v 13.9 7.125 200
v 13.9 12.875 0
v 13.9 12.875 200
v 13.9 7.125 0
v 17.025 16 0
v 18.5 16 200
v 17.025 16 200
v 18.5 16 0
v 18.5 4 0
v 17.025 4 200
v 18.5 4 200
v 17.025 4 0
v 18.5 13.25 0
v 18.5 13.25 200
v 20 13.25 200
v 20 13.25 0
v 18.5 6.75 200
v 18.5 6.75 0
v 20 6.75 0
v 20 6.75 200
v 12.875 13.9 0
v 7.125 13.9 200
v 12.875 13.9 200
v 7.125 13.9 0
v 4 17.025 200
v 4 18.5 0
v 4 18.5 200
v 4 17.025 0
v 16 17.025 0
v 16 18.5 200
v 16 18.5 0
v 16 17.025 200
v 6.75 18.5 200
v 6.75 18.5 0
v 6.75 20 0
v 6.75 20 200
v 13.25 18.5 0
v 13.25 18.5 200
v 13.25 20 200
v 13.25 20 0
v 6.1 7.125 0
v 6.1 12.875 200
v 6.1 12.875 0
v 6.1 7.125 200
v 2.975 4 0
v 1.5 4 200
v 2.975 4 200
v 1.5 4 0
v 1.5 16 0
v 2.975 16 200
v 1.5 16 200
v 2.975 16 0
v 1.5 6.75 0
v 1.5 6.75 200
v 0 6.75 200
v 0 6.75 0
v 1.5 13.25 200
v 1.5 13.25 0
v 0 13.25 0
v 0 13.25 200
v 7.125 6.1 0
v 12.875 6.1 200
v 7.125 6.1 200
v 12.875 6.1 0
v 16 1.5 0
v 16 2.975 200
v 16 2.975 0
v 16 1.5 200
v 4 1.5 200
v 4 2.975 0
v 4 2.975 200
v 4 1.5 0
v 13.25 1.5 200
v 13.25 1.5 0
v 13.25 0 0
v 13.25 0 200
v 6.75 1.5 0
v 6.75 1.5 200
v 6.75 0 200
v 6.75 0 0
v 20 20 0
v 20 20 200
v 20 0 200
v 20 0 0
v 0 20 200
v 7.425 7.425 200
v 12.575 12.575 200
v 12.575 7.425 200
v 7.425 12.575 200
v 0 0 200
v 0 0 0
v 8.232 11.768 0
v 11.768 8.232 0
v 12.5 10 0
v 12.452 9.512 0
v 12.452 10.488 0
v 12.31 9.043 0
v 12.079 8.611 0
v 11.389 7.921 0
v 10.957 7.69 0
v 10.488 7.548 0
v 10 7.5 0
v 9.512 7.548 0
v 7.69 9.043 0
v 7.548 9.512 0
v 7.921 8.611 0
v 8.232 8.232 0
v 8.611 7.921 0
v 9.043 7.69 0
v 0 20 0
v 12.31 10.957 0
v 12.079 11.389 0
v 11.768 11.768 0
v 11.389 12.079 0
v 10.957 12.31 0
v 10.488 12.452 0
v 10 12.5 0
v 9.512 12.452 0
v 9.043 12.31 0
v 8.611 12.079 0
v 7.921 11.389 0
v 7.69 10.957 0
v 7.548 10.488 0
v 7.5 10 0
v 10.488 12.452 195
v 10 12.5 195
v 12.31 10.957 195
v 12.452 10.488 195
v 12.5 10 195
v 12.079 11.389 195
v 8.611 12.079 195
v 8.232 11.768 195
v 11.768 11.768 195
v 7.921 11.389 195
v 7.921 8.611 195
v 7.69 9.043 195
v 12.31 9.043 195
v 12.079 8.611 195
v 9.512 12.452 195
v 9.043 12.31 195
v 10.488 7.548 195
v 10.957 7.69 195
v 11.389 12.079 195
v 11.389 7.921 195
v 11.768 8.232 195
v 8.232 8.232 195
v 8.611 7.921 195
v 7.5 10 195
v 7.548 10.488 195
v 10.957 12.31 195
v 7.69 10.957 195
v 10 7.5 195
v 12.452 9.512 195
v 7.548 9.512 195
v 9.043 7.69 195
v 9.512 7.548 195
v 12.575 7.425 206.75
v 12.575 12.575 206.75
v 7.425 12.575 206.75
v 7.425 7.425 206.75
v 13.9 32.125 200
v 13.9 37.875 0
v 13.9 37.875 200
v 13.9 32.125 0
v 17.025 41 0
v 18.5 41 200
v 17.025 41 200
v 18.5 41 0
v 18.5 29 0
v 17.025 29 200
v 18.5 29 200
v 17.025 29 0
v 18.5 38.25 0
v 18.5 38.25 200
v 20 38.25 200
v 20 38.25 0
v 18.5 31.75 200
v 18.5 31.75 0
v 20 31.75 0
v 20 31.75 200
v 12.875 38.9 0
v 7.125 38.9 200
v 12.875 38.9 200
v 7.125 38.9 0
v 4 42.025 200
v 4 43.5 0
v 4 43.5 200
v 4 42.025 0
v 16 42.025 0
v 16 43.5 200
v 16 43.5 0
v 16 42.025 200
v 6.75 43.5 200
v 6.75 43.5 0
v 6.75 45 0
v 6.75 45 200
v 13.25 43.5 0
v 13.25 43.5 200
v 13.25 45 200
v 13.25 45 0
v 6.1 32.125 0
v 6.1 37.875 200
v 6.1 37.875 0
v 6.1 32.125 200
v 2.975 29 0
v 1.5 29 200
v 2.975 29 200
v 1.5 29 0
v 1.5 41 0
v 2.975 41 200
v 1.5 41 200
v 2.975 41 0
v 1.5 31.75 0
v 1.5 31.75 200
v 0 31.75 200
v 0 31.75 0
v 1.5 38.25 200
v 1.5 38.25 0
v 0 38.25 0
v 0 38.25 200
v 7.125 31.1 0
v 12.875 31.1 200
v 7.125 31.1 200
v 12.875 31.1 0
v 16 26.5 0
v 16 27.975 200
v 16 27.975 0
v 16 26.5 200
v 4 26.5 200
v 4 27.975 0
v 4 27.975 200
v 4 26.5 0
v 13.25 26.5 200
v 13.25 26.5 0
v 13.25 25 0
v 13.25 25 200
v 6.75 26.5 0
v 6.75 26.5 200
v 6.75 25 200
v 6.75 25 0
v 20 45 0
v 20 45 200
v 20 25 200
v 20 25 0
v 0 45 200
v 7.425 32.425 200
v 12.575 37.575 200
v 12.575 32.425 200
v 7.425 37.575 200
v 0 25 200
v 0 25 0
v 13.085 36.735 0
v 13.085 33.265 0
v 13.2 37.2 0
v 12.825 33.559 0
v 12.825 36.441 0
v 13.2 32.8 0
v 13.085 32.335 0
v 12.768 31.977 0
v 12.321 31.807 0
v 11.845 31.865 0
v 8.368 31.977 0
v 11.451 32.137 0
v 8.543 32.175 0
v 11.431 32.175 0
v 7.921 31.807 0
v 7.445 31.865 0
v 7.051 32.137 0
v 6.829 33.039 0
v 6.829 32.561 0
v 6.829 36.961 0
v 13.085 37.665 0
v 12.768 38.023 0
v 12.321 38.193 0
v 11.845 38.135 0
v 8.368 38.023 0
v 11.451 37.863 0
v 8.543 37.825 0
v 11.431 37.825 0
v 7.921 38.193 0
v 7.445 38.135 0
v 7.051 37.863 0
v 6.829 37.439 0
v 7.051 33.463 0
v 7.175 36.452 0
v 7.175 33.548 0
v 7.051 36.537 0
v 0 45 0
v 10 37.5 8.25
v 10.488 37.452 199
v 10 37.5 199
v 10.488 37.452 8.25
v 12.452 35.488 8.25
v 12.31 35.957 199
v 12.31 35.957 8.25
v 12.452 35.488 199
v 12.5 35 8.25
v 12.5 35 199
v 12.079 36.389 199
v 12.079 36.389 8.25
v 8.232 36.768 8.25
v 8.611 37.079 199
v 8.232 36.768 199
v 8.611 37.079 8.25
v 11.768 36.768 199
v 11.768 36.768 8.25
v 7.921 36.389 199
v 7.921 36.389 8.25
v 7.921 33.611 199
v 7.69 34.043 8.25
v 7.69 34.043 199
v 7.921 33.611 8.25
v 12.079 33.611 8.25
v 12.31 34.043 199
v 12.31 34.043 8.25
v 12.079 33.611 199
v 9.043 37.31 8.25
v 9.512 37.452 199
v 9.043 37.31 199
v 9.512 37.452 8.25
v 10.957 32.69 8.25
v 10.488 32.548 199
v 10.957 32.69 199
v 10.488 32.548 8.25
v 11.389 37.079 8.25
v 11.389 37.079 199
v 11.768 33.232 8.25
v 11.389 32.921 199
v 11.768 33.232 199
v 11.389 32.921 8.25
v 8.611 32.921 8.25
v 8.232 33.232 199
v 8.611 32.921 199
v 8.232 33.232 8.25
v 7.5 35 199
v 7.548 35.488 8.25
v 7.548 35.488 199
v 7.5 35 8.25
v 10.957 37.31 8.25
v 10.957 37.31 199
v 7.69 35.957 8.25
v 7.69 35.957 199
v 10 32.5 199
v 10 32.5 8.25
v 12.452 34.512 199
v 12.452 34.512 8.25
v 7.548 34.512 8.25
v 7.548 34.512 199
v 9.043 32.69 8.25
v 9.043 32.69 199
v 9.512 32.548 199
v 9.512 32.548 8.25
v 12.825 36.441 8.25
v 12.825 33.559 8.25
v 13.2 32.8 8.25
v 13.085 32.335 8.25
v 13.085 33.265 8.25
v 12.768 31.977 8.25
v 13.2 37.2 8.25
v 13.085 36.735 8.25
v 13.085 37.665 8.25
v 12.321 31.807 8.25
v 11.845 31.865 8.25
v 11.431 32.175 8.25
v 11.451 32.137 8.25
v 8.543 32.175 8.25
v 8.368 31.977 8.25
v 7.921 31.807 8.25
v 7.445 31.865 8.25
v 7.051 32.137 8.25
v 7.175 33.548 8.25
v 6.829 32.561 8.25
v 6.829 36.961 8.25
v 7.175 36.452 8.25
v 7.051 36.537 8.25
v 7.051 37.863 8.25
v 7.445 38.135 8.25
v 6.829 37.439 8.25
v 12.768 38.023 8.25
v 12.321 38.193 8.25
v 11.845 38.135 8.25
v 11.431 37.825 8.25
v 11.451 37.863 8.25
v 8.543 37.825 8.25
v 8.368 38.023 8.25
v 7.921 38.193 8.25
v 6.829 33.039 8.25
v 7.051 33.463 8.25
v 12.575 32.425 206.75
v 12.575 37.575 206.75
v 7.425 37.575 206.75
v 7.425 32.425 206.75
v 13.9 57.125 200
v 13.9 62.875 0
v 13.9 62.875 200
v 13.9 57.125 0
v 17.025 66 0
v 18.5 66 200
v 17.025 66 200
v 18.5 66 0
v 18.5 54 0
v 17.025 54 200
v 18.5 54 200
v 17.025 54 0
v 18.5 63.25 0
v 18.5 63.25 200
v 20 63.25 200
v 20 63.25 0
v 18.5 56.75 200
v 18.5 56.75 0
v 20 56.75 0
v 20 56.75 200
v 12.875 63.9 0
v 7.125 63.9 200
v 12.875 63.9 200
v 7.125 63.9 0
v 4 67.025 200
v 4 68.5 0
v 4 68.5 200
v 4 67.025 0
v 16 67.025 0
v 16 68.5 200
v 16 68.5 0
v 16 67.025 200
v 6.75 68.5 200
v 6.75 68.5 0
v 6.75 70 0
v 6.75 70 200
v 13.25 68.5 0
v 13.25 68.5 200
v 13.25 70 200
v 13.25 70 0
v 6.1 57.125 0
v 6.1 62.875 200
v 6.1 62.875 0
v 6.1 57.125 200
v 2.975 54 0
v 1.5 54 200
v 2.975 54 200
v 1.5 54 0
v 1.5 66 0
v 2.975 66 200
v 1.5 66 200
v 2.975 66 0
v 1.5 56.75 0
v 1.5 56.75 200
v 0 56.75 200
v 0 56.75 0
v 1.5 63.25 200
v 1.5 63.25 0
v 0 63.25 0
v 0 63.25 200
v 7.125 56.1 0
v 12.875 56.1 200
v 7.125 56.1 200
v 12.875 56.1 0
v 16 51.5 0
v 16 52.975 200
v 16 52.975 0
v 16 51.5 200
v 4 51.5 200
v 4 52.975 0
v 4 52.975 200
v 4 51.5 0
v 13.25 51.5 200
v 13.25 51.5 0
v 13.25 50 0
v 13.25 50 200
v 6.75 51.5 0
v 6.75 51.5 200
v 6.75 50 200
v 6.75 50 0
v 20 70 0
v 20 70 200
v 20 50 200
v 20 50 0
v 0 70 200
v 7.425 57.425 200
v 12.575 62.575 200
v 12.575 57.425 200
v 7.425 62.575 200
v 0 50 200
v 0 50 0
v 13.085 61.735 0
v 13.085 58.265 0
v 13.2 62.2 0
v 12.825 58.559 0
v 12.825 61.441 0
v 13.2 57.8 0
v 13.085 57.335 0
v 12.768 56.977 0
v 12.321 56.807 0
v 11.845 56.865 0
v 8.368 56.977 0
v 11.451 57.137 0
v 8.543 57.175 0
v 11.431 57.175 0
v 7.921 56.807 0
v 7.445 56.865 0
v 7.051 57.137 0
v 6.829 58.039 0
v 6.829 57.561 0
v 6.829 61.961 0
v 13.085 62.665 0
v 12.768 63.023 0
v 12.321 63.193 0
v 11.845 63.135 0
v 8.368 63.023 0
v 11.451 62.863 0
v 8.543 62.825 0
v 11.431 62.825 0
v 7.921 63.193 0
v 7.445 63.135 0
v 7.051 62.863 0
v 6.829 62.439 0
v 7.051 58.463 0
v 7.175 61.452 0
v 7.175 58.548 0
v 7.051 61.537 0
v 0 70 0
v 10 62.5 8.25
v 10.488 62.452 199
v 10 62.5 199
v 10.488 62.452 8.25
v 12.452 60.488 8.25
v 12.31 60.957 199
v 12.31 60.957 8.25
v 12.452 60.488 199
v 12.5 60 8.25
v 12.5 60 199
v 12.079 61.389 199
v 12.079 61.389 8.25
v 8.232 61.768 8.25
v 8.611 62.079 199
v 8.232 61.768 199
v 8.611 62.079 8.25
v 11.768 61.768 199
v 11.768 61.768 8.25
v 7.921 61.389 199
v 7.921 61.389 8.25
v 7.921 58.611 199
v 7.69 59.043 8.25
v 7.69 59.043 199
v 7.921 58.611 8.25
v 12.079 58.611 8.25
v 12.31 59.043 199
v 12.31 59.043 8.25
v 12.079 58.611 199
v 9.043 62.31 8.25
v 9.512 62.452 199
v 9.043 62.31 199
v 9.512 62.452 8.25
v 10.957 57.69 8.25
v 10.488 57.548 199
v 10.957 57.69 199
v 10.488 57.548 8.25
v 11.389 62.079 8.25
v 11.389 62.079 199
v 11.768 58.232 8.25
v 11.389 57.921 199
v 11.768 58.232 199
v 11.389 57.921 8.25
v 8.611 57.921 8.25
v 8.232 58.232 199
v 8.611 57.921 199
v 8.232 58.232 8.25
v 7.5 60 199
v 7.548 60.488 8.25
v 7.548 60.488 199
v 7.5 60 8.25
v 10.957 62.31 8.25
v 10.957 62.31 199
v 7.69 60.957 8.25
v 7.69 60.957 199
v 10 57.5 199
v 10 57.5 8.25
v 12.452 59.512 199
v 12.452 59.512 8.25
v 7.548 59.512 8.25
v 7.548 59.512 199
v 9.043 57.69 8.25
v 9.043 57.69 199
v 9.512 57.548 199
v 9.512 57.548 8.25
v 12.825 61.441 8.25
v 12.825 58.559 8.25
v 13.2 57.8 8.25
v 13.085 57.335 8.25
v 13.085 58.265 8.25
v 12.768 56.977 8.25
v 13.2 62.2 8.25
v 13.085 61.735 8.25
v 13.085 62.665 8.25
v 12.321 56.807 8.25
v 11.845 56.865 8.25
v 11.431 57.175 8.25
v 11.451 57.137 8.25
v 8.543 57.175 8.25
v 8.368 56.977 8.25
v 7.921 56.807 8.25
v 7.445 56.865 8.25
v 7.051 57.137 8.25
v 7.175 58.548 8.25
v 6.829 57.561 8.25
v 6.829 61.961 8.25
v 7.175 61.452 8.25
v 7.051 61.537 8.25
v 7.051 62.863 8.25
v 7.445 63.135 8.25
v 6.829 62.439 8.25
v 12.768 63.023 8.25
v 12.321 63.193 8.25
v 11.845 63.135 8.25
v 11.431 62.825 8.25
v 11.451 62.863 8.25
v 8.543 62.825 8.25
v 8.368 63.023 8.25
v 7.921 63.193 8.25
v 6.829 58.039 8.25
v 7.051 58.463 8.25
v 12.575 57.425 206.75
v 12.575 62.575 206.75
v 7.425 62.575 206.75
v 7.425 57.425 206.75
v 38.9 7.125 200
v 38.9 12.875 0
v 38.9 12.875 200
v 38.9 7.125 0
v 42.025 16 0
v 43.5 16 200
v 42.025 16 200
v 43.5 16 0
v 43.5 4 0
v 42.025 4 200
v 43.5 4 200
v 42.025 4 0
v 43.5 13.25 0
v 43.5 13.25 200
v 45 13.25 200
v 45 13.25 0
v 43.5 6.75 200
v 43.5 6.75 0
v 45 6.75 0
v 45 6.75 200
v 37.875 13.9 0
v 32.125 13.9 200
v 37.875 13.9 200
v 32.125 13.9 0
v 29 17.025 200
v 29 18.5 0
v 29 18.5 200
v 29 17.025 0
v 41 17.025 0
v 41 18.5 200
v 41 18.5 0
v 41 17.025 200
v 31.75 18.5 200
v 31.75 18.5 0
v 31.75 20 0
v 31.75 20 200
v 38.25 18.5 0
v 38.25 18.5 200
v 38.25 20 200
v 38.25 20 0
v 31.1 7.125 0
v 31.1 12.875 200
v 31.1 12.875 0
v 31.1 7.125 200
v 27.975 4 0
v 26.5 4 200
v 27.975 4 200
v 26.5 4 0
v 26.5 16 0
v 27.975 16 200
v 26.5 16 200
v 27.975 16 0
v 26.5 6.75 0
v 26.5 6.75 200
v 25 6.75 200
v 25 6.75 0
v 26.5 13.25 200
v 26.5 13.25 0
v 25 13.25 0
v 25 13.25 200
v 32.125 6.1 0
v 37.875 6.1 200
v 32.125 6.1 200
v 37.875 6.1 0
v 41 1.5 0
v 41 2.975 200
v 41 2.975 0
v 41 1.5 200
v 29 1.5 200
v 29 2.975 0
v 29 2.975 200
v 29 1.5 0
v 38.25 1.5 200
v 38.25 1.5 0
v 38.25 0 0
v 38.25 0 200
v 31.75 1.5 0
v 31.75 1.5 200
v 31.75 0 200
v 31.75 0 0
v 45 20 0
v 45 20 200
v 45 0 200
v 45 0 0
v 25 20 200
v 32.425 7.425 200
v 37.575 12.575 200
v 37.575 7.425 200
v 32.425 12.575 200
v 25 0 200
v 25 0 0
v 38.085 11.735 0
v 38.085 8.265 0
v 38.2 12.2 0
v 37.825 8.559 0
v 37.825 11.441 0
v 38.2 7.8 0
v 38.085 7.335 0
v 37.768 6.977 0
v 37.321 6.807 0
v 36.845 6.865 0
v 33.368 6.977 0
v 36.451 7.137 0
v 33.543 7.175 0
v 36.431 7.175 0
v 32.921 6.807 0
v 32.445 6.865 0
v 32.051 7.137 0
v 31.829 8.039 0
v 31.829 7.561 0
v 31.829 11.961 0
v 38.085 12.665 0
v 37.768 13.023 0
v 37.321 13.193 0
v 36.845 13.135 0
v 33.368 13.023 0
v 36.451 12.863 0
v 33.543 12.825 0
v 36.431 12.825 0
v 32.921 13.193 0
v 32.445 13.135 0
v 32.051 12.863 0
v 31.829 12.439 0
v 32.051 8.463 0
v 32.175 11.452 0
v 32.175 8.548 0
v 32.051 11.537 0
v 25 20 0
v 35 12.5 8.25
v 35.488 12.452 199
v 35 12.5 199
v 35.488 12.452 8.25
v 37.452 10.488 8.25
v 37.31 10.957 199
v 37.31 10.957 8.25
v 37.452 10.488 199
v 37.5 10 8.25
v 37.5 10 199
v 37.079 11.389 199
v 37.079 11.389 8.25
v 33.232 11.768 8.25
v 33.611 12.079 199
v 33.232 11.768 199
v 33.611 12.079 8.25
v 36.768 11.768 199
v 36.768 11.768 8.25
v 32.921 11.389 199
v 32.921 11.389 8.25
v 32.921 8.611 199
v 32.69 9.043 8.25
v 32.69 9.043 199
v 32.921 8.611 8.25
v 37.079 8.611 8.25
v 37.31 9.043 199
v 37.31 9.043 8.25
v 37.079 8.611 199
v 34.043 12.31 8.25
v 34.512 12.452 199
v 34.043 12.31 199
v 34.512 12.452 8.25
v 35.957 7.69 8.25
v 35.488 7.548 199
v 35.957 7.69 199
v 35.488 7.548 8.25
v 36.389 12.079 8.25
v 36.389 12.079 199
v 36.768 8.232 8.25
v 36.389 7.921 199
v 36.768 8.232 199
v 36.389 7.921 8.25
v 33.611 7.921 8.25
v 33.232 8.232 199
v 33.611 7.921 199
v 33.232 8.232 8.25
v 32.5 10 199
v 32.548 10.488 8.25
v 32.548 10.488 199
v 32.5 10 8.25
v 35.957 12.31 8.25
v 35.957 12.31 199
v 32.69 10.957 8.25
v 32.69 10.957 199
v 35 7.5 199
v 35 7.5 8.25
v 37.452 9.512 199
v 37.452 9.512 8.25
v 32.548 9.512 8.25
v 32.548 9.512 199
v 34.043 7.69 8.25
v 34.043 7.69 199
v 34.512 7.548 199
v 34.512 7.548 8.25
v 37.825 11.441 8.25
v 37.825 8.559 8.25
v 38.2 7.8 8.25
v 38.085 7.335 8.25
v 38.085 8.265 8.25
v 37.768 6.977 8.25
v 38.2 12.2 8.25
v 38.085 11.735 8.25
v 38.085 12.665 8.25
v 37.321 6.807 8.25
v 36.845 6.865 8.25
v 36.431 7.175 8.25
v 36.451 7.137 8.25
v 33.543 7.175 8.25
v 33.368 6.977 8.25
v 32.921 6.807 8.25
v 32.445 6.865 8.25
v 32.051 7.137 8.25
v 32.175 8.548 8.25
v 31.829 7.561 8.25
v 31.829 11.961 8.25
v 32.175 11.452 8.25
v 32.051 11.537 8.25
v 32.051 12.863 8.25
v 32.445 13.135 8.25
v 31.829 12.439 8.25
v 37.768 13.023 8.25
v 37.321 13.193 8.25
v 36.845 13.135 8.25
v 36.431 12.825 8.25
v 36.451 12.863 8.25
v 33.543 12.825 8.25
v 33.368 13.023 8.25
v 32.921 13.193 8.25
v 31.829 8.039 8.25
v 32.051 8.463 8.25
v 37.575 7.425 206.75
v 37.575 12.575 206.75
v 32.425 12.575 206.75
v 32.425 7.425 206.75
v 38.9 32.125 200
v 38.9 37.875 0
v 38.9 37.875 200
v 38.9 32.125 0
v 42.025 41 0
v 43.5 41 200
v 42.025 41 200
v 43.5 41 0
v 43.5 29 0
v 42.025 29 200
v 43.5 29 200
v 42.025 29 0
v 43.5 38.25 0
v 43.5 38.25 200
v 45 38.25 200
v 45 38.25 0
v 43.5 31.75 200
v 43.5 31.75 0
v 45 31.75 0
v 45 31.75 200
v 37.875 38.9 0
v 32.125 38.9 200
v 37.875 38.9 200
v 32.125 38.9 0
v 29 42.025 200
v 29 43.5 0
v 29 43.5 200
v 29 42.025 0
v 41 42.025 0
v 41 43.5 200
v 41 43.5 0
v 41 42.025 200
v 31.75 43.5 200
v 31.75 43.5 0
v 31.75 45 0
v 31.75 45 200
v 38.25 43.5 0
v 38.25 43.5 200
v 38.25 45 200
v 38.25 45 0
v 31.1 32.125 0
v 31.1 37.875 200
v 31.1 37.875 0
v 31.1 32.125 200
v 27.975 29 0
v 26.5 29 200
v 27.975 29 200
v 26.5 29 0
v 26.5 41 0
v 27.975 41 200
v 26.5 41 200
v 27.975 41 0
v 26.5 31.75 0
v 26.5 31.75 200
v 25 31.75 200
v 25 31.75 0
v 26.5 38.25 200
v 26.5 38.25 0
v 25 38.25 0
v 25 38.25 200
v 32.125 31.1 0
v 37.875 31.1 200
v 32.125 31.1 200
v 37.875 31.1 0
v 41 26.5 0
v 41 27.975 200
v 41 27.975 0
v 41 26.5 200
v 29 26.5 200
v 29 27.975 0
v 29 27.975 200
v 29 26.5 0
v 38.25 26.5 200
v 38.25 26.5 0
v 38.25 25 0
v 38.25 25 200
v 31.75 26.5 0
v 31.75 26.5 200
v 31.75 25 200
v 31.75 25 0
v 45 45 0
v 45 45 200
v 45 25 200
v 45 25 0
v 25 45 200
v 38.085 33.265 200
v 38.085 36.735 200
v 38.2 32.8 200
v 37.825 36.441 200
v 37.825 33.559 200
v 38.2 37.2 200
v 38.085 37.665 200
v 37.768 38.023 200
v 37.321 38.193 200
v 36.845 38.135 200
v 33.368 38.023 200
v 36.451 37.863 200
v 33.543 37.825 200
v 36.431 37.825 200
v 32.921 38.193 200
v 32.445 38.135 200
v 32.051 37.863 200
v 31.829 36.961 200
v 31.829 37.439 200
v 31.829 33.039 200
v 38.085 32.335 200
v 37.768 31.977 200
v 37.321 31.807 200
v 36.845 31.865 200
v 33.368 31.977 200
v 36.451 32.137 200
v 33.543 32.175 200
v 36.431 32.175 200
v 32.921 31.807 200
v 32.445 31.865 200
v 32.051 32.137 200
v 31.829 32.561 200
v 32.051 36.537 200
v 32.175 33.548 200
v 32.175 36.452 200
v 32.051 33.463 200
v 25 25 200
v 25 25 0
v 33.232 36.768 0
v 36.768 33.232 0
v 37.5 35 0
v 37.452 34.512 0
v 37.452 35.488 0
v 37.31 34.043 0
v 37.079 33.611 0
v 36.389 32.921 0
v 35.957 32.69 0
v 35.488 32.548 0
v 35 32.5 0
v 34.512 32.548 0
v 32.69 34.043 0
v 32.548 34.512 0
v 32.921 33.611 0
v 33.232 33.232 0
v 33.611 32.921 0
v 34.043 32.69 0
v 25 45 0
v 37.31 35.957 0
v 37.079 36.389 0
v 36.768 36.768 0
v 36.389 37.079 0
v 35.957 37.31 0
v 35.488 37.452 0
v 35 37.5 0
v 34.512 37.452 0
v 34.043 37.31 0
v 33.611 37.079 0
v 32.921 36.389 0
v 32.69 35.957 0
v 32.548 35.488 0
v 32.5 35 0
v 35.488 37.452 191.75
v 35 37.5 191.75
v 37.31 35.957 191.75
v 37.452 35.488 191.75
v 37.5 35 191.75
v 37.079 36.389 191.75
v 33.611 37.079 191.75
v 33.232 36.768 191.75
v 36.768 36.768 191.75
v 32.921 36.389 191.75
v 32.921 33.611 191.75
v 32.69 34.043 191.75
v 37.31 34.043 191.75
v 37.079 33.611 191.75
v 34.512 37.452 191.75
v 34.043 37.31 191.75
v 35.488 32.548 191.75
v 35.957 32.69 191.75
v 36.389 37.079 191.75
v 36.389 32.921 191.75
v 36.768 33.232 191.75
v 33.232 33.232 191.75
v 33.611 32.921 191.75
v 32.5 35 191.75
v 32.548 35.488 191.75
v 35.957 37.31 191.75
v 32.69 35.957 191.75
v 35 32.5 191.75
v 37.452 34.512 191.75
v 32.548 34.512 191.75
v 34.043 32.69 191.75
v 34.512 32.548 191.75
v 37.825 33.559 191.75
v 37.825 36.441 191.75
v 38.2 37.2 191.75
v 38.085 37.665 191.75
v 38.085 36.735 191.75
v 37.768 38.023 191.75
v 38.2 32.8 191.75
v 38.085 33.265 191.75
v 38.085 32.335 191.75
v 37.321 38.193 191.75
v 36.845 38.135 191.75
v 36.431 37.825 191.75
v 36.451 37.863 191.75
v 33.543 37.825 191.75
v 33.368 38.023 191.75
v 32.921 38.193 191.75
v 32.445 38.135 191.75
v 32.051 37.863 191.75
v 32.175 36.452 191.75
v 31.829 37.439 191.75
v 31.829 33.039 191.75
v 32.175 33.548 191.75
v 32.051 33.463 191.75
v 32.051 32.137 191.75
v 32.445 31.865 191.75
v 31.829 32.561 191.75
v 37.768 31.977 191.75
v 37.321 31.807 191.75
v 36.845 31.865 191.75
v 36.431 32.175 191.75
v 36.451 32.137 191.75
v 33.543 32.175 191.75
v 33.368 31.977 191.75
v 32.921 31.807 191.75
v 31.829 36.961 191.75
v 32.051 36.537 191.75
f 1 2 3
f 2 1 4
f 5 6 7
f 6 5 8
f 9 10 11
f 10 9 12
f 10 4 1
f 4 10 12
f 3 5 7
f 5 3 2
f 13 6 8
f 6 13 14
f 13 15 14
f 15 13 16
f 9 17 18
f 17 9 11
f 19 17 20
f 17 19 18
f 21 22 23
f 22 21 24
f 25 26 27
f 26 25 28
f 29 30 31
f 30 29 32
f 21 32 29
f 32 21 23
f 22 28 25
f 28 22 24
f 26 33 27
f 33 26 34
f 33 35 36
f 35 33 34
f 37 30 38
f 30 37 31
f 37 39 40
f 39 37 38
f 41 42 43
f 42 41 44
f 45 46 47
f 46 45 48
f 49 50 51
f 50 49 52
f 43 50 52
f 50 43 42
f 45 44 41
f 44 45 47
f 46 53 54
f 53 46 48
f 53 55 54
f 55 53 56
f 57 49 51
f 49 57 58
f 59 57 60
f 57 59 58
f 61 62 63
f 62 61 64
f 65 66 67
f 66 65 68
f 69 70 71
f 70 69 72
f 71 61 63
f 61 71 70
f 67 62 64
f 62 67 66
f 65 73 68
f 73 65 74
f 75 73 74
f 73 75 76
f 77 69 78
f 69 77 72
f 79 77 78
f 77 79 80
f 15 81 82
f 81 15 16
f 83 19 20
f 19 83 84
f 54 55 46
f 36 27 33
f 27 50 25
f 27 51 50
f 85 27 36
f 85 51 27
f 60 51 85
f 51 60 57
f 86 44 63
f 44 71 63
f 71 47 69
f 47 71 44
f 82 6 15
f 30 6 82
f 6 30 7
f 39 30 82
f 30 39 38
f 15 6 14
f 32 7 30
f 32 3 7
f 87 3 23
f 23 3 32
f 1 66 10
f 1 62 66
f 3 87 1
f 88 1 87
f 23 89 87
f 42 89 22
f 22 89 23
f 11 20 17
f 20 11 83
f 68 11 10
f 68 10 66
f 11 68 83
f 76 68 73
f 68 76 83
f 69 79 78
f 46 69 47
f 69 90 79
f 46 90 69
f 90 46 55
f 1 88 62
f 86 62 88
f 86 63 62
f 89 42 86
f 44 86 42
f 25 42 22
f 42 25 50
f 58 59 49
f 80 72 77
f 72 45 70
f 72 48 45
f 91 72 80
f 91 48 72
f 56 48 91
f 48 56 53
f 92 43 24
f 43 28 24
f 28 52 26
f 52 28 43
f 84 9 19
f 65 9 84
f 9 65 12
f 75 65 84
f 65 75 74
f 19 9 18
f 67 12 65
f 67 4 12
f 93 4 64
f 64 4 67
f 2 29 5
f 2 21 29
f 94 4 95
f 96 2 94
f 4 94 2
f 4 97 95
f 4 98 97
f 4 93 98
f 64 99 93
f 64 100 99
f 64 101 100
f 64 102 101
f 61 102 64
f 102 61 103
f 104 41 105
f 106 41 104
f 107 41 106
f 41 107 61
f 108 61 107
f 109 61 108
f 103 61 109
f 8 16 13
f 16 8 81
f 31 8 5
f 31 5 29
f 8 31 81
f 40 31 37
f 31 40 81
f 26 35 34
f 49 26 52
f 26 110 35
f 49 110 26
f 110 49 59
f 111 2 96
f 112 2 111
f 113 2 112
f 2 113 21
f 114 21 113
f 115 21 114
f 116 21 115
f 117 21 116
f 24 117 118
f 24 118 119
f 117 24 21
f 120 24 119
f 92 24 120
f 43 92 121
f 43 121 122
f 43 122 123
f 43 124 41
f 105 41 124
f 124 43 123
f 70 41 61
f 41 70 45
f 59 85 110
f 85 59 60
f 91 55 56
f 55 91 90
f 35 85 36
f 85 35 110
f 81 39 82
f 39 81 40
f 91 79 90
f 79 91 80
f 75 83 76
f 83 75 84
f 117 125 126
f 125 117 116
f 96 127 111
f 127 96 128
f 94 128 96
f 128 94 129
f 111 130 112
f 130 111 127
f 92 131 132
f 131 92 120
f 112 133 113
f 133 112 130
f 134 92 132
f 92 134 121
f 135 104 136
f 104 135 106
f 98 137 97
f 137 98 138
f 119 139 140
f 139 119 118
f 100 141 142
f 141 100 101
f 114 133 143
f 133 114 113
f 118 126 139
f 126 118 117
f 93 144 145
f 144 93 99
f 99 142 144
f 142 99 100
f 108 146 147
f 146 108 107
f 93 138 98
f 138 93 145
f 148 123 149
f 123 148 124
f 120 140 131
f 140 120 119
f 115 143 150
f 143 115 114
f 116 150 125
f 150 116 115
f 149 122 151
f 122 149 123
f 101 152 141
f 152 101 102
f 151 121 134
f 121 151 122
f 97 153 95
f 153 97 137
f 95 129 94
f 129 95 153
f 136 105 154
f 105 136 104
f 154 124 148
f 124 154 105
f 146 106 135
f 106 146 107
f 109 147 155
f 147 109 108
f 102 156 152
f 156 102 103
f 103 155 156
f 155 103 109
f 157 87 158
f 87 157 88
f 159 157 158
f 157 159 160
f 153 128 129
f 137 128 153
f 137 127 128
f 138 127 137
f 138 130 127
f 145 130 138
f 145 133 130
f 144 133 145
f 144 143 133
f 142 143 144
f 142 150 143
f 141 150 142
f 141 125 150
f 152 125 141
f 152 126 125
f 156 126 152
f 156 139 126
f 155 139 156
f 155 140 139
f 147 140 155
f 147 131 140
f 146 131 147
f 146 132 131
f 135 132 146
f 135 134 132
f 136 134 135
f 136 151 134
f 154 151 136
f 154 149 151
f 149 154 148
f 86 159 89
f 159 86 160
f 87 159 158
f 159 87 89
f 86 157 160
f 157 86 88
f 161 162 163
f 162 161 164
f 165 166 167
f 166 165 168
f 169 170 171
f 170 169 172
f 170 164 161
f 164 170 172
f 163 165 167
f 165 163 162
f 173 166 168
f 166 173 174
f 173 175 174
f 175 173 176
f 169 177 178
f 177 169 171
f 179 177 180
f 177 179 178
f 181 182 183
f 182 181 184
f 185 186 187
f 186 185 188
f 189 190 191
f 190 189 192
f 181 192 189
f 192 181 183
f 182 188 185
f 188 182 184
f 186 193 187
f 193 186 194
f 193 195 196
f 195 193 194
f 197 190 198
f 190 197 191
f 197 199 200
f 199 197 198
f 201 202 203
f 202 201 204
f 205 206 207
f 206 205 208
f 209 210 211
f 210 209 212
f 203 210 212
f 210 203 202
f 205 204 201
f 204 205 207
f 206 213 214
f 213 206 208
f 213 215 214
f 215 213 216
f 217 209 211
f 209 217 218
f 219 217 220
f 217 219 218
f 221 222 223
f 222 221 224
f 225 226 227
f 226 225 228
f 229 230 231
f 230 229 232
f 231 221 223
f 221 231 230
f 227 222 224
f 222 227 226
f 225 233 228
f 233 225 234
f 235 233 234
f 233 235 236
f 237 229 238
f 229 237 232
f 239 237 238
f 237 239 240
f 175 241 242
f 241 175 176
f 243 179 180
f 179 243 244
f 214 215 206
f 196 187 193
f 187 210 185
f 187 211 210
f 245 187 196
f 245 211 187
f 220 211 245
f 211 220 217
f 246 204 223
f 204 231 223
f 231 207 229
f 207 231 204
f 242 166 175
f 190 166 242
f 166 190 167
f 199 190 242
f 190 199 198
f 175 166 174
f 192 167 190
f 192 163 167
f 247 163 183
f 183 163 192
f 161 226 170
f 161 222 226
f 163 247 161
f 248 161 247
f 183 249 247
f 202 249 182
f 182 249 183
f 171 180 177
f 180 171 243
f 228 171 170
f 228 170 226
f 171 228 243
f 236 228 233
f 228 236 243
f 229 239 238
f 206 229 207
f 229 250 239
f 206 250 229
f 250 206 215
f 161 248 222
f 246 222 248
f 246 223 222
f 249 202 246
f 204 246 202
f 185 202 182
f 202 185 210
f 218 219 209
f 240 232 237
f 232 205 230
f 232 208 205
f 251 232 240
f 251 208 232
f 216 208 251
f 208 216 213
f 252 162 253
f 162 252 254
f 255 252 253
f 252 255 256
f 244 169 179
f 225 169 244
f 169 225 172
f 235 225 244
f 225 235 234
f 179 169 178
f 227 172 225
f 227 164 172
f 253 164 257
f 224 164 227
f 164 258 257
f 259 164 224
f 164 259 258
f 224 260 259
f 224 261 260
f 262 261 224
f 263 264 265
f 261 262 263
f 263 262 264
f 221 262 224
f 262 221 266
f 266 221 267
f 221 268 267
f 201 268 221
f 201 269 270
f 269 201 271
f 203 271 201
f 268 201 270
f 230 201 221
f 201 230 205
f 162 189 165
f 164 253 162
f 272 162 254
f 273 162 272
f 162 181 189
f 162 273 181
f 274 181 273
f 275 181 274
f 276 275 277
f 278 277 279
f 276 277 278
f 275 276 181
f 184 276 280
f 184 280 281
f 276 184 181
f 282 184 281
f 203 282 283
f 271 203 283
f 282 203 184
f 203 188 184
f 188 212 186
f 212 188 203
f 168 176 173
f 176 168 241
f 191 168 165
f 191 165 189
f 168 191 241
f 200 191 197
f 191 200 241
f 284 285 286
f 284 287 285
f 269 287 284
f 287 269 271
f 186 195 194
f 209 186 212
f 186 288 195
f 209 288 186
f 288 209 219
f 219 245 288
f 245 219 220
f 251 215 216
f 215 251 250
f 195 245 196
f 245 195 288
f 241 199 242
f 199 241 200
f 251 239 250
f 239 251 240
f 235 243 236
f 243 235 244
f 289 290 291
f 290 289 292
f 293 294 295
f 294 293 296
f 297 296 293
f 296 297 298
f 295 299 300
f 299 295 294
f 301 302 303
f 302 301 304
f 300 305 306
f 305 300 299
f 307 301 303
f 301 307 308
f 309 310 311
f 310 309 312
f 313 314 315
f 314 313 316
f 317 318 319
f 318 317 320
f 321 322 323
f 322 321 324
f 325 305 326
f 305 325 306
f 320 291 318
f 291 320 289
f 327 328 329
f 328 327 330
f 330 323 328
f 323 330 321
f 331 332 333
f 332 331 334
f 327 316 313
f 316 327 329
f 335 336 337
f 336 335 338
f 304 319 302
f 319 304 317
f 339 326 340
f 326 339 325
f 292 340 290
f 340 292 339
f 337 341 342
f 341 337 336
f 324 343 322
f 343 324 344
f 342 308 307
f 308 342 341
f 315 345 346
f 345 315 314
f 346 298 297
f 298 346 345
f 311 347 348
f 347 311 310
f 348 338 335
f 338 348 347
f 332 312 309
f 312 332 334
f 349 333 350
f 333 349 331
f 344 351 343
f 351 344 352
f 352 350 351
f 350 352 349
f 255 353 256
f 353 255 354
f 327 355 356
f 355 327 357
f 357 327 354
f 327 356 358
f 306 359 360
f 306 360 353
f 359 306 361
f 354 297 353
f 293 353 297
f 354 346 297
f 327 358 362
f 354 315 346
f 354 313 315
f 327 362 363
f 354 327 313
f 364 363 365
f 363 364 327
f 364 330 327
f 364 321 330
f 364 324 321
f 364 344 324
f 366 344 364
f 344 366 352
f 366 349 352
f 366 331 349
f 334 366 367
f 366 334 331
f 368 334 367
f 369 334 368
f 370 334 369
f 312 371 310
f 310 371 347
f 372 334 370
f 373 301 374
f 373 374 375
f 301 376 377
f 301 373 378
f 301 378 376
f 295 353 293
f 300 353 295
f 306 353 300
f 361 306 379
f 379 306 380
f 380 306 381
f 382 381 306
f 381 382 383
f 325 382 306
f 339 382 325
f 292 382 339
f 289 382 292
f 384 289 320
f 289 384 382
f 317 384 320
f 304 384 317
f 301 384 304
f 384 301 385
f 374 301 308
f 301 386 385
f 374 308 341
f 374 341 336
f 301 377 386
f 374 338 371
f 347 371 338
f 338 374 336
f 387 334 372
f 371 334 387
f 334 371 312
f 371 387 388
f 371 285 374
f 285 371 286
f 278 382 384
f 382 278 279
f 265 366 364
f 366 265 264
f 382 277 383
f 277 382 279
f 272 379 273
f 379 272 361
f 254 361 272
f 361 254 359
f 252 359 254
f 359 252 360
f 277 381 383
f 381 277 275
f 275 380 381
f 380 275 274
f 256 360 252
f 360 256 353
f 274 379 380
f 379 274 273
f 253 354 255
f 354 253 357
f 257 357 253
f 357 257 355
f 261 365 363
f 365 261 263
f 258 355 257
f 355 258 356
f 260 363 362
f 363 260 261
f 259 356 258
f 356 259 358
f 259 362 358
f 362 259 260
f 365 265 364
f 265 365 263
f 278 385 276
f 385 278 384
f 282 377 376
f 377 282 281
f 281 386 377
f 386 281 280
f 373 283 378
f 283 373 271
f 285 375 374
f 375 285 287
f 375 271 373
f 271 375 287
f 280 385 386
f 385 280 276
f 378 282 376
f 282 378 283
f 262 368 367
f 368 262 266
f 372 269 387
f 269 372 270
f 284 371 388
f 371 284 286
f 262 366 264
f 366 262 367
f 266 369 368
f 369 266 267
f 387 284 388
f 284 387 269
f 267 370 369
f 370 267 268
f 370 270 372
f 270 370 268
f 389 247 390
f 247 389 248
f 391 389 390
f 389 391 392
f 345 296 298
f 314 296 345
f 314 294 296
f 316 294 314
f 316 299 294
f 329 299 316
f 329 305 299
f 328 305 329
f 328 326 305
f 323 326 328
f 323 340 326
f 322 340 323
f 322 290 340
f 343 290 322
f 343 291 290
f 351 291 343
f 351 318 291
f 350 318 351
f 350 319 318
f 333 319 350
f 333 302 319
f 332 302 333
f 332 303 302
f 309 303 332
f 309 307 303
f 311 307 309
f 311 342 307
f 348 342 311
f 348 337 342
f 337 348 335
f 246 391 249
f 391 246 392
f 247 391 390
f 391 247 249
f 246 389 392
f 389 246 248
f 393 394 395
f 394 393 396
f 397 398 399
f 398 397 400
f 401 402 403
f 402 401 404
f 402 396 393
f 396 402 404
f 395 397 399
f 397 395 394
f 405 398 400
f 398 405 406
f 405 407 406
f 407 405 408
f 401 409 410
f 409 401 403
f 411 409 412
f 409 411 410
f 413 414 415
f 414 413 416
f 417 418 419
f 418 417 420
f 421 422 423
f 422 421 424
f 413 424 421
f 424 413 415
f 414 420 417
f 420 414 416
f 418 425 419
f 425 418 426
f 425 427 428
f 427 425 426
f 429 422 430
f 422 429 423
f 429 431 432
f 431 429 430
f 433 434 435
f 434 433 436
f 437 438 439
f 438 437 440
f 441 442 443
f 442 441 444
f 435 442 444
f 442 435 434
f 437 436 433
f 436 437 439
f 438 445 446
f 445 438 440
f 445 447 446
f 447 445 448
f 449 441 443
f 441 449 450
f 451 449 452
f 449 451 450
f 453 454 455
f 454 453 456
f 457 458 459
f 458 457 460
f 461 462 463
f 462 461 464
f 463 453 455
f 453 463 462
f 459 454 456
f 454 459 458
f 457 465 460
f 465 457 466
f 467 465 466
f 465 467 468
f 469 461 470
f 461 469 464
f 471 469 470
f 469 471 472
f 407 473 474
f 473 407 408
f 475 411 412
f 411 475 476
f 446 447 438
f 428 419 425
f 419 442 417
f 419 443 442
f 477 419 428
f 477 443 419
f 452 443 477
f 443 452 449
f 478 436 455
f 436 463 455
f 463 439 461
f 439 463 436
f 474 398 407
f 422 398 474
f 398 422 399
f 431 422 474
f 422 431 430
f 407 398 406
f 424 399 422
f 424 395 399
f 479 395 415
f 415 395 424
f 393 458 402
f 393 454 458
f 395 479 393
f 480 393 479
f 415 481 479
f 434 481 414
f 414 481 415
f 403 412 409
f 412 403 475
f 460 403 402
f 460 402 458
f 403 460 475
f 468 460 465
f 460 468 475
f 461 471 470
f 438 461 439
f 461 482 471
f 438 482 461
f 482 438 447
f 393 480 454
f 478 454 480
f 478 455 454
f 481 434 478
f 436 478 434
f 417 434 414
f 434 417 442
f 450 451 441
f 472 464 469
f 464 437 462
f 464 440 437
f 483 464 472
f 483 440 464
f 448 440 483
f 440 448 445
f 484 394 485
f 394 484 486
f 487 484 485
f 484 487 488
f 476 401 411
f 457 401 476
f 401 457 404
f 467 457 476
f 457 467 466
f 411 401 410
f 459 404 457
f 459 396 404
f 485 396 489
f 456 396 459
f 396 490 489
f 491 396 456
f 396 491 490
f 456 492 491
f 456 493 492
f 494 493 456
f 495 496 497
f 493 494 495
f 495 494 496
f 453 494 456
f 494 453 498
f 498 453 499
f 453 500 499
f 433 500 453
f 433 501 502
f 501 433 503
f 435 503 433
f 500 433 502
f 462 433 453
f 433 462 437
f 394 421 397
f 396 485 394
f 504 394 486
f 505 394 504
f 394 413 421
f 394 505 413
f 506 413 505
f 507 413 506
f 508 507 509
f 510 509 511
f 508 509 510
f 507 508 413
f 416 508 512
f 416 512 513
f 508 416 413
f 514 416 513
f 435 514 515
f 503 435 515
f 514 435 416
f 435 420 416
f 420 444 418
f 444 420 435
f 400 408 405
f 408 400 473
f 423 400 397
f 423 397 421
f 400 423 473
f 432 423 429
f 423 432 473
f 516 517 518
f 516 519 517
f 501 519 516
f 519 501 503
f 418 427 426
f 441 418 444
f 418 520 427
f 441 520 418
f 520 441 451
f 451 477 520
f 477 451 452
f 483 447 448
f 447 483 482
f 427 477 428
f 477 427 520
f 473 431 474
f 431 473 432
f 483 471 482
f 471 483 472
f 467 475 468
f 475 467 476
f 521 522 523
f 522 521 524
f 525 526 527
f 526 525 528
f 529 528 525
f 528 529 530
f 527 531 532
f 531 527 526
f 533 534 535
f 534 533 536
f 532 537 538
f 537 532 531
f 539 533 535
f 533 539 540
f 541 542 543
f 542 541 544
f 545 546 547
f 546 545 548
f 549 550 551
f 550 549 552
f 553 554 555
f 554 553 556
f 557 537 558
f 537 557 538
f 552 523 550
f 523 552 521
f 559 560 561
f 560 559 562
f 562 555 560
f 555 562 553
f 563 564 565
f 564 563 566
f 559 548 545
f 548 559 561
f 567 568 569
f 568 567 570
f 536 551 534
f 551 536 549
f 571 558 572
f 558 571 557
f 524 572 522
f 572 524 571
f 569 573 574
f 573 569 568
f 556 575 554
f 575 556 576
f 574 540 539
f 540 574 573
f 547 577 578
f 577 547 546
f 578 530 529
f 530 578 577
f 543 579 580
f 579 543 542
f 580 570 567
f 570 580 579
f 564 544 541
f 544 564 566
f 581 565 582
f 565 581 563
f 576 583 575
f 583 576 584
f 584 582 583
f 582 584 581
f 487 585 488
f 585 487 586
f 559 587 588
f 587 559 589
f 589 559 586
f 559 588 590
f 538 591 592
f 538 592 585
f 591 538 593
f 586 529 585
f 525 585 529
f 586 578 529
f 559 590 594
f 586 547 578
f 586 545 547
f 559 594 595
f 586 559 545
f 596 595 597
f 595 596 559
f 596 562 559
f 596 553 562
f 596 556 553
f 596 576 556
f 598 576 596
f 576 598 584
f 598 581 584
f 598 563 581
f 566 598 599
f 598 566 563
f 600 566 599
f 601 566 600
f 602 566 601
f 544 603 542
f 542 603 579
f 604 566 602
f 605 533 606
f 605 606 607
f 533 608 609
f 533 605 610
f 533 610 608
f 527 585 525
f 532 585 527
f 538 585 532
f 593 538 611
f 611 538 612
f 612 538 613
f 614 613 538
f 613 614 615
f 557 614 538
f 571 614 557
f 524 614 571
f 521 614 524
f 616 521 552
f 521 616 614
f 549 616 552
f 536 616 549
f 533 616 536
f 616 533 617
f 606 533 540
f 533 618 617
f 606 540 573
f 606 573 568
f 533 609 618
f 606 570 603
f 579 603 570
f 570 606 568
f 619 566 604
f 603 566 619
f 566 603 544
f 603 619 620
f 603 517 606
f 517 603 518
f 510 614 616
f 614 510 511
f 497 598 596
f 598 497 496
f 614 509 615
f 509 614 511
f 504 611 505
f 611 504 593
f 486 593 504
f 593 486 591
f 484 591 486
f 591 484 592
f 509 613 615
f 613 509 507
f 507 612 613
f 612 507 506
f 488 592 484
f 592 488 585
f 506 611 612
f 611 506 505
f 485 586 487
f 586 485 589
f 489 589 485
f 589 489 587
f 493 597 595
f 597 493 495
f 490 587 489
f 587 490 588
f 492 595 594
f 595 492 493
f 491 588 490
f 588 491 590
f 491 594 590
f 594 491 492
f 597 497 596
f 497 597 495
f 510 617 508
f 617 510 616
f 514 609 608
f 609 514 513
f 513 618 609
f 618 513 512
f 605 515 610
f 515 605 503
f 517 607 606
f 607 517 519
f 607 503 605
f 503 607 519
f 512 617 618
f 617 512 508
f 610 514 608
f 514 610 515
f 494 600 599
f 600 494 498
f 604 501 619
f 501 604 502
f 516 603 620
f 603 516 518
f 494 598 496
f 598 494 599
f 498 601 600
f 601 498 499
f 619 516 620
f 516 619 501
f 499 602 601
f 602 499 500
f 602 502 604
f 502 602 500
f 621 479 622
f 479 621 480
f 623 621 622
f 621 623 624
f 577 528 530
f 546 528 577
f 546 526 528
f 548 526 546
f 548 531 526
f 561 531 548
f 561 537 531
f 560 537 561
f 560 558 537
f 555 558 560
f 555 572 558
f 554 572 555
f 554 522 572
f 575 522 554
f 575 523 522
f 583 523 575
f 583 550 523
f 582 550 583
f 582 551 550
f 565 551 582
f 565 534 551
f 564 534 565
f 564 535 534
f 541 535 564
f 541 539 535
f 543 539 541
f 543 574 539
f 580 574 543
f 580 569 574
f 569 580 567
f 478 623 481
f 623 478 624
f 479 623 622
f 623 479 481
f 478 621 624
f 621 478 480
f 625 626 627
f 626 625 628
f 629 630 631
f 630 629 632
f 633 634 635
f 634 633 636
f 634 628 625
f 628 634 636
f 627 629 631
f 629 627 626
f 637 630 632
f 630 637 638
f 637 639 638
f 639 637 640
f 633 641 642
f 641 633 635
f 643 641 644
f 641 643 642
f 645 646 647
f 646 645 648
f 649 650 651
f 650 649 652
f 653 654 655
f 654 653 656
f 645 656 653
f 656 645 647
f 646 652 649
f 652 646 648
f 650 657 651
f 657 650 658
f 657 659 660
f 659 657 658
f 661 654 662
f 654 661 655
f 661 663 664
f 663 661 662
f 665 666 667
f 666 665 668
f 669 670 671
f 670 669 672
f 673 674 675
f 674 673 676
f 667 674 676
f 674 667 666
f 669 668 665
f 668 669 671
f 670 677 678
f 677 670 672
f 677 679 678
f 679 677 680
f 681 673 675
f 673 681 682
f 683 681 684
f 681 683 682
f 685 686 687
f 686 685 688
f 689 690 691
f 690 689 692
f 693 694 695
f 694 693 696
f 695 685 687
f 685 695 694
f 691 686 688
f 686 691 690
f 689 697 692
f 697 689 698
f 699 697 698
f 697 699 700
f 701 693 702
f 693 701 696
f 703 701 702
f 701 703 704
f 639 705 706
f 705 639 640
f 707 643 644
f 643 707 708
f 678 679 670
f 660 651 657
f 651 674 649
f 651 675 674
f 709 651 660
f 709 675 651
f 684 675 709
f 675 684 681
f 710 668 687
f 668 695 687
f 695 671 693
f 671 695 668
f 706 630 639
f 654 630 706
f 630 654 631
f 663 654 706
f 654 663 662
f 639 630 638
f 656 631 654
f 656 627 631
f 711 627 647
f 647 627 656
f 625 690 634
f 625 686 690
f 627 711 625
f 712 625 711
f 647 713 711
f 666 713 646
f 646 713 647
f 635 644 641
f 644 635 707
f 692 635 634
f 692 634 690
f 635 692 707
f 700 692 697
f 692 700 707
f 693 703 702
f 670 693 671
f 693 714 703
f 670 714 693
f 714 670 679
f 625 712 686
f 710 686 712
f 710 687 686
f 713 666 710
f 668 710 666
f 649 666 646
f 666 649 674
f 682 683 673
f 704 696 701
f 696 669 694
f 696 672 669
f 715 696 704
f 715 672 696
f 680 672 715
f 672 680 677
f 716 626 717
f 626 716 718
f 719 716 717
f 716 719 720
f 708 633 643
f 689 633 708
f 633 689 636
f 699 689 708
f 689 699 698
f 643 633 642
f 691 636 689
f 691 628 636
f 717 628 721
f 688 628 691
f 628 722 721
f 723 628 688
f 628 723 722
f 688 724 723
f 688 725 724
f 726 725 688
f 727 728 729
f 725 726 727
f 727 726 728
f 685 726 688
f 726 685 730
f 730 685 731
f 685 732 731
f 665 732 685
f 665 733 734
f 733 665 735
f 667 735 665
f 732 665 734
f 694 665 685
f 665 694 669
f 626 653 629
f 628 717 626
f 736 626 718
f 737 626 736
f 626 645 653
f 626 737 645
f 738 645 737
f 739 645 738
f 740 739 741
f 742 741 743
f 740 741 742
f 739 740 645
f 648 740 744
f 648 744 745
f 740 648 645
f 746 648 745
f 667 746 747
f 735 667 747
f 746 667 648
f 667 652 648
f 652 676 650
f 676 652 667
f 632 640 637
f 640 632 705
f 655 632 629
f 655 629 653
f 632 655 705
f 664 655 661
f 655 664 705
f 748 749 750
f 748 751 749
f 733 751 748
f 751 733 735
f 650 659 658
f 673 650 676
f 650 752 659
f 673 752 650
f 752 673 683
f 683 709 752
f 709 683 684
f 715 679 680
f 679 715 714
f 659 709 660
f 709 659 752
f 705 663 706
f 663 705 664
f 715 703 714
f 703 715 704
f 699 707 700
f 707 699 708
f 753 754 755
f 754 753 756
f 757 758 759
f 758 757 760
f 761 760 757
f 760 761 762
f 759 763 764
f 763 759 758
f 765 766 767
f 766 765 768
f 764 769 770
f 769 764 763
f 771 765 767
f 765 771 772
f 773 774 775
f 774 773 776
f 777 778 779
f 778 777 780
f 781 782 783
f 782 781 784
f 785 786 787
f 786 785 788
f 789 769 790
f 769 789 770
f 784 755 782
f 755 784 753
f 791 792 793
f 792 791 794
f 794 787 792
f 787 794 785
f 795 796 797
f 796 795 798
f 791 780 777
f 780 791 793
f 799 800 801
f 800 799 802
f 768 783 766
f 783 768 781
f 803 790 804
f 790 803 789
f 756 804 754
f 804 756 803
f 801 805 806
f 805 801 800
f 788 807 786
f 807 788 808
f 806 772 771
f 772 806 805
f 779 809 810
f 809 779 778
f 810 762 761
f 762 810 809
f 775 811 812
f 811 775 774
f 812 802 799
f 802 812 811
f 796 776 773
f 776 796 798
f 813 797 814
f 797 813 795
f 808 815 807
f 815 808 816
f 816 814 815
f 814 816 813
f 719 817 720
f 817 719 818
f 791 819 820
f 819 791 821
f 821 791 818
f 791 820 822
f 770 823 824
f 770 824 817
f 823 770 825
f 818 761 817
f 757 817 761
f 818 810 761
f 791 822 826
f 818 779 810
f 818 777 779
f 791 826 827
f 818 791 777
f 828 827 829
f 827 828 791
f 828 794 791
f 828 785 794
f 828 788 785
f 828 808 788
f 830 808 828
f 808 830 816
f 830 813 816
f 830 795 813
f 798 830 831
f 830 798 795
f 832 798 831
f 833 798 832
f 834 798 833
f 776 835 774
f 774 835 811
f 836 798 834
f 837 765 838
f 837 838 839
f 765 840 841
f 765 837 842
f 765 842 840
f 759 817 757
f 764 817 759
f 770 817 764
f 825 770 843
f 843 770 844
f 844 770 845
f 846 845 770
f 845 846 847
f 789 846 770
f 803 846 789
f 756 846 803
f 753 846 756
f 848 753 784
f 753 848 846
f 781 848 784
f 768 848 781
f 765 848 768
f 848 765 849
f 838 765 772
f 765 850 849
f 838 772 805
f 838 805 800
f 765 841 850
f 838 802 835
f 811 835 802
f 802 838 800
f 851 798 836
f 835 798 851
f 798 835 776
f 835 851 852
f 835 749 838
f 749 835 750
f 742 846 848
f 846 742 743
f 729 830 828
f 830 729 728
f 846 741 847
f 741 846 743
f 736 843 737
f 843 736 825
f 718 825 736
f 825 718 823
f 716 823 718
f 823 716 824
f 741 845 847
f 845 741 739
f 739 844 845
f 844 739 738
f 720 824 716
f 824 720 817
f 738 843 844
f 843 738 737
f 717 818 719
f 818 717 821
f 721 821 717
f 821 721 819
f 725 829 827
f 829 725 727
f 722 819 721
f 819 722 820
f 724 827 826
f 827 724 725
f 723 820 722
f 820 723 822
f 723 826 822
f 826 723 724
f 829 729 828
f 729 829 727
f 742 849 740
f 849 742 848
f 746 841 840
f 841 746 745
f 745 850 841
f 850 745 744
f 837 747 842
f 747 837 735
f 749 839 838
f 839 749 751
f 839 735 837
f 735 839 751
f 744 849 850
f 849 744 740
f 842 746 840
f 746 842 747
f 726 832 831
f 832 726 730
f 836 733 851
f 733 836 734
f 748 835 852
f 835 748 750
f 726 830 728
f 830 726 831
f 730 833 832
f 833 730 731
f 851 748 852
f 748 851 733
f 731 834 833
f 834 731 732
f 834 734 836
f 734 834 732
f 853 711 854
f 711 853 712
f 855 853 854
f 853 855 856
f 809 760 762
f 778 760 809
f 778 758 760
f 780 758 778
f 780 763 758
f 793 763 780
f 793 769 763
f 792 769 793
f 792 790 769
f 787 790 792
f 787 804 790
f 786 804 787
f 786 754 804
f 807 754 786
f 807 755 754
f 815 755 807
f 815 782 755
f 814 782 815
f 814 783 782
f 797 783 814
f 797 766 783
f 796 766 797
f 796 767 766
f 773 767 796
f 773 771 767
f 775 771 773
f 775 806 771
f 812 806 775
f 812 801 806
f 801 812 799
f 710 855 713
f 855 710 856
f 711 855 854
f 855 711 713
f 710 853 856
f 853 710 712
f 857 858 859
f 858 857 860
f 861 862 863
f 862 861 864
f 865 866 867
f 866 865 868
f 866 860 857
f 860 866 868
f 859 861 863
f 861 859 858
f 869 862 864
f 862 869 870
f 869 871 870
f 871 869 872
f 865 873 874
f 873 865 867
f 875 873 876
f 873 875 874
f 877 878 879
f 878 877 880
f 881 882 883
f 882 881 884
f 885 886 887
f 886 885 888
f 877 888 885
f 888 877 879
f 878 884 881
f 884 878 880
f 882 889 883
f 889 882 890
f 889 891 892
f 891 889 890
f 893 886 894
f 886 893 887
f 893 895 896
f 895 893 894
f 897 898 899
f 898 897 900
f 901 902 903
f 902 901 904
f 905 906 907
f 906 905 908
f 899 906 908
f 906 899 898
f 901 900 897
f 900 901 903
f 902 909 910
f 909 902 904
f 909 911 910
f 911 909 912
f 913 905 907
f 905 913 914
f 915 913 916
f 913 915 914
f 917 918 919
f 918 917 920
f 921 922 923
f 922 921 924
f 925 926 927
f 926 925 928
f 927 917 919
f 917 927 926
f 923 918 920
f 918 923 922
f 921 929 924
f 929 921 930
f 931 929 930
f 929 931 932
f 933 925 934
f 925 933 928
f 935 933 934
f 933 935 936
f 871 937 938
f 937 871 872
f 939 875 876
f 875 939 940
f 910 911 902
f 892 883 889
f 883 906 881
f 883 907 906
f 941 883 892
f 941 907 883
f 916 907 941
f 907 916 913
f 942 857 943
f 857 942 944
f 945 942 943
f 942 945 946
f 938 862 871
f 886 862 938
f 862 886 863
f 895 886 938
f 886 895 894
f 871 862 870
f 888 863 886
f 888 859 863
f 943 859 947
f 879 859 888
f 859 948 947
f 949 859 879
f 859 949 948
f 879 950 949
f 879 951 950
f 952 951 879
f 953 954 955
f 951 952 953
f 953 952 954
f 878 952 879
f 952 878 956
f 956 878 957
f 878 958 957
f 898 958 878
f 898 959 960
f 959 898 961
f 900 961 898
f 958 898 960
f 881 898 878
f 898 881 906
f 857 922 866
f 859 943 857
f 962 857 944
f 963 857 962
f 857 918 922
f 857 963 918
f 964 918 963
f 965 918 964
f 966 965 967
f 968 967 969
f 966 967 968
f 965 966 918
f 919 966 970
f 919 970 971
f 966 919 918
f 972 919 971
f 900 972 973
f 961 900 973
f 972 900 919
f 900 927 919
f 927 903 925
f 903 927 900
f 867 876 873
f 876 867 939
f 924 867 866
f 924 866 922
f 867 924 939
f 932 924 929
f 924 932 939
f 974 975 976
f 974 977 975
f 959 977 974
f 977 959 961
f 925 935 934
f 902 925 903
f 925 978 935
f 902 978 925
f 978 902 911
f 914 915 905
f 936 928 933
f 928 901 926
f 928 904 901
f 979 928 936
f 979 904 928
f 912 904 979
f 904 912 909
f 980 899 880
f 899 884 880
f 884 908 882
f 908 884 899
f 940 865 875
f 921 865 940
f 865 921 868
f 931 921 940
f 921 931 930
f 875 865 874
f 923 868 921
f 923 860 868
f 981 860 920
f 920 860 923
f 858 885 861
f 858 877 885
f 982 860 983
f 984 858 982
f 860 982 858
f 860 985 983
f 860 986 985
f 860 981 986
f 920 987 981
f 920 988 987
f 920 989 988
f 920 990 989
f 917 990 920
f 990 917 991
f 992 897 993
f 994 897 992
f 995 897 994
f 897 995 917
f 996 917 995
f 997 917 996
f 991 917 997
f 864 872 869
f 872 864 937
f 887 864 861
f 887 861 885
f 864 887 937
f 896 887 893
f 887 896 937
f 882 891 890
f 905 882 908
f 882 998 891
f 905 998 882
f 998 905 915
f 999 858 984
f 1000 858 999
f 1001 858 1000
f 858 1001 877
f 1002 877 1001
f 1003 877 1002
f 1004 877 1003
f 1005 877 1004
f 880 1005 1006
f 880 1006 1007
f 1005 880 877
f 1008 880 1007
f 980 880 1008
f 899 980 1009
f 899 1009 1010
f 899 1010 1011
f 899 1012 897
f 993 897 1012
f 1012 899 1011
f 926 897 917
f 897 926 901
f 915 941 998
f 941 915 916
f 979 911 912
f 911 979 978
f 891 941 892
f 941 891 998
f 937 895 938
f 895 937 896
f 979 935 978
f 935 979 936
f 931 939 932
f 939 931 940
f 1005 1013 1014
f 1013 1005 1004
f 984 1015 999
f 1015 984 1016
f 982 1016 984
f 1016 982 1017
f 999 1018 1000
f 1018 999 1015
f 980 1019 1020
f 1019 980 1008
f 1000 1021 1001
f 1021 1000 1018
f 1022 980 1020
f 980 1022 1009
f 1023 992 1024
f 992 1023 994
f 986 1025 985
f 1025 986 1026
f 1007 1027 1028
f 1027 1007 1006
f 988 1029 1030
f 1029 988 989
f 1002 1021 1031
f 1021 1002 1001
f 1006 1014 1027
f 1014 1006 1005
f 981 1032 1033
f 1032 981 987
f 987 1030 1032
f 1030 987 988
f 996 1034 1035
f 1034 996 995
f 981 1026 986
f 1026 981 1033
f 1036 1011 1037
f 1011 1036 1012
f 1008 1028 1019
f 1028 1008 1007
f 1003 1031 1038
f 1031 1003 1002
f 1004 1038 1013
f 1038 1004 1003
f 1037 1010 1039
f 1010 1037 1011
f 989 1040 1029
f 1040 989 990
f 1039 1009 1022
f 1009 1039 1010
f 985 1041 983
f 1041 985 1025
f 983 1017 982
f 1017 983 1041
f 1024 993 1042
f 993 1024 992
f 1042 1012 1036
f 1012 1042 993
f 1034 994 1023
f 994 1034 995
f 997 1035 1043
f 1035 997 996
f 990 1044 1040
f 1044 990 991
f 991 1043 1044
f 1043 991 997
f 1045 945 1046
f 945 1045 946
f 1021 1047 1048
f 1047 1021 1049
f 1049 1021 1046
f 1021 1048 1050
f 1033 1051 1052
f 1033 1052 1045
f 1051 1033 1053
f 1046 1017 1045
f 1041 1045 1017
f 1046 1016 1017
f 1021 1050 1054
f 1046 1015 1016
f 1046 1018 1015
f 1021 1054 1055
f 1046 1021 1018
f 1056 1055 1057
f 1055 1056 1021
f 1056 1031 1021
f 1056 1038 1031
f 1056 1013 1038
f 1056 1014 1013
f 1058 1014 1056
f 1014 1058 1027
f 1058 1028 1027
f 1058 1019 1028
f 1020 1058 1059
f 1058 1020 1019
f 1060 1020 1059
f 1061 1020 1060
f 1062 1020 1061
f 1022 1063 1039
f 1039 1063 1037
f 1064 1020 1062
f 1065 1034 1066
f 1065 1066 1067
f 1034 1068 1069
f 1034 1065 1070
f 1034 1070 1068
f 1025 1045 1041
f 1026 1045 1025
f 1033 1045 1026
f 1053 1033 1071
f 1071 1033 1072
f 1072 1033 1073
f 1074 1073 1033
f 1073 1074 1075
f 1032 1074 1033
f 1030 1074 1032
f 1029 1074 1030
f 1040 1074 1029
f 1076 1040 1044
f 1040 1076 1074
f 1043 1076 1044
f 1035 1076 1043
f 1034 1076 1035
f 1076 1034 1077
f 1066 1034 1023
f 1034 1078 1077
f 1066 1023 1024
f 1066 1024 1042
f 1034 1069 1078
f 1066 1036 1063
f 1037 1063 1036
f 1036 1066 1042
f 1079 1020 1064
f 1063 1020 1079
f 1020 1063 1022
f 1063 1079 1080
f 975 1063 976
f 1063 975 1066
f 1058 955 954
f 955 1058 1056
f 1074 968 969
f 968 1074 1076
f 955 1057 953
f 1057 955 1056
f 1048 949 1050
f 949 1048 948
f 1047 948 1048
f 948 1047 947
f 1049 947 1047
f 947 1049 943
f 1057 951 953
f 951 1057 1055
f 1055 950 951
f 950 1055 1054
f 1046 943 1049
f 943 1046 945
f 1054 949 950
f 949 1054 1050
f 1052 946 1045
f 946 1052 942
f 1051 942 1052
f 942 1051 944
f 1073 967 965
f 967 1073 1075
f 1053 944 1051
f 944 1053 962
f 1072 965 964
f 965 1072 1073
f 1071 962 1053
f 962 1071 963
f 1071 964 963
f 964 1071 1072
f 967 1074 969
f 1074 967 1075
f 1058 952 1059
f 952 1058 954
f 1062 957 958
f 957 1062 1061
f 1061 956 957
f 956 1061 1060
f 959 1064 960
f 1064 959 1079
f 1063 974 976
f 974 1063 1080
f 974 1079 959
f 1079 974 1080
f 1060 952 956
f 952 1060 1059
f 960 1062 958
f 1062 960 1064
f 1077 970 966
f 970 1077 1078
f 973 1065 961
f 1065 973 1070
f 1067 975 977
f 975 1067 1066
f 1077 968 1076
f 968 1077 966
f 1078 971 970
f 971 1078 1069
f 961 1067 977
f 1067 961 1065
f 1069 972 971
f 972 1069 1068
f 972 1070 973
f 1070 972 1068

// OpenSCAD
profileLength = 1000;
//printX = 150; Not implemented
//printY = 150; Not implemented
printZHeight = 230;
printTolerance = 0.25; //Change dimensions of pin and hole 0.25mm equals gab of 0.5 mm
spaceBetweenProfiles = 5;
$fa=0.5; // default minimum facet angle is now 0.5
$fs=0.5; // default minimum facet size is now 0.5 mm

if(profileLength <= printZHeight) {
	translate([10,10,profileLength/2]) profile(profileLength);
} else {
	numOfProfiles = ceil(profileLength/(printZHeight-8));
	numOfRow = ceil(sqrt(numOfProfiles));
	currentProfile = 2;
	start = 0;
	translate([start,start,0]) profileWithPin(profileLength/numOfProfiles, printTolerance);
	for(row=[0:numOfRow-1]) {
		for(col=[0:numOfRow-1]) {
			if(row*numOfRow+col < numOfProfiles-1 && row*numOfRow+col > 0) {
				translate([start+row*(20+spaceBetweenProfiles),start+col*(20+spaceBetweenProfiles),0]) profileWithHoleAndPin(profileLength/numOfProfiles, printTolerance);
			} else {
				if(row*numOfRow+col < numOfProfiles) {
					translate([start+row*(20+spaceBetweenProfiles),start+col*(20+spaceBetweenProfiles),0]) profileWithHole(profileLength/numOfProfiles, printTolerance);
					lastProfileDone = 1;
				}
			}
		}
	}
}

module hole(height, size) {
	radius = 1;
	divider = 1.6;
	union() {
		cube([size,size,height], center = true);
		translate([size/2-radius/divider,size/2-radius/divider,0]) cylinder(h=height, r=radius, center = true);
		translate([size/2-radius/divider,-size/2+radius/divider,0]) cylinder(h=height, r=radius, center = true);
		translate([-size/2+radius/divider,size/2-radius/divider,0]) cylinder(h=height, r=radius, center = true);
		translate([-size/2+radius/divider,-size/2+radius/divider,0]) cylinder(h=height, r=radius, center = true);
	}
}

module profileWithPin(length, tolerance) {
	height = 8 - tolerance - 1;
	size = 5.4 - tolerance;
	plunge = 5;
	translate([10,10,length/2]) union() {
		profile(length);
		translate([0,0,length/2+(height+plunge)/2-plunge]) cube([size,size,height+plunge], center = true);
	}
}

module profileWithHole(length, tolerance) {
	height = 8 + tolerance;
	size = 5.4 + tolerance;
	plunge = 1;
	translate([10,10,length/2]) difference() {
		profile(length);
		translate([0,0,length/2-(height+plunge)/2+plunge]) hole(height+plunge, size);
	}
}

module profileWithHoleAndPin(length, tolerance) {
	heightHole = 8 + tolerance;
	heightPin = 7 - tolerance;
	size = 5.4;
	plunge = 1;
	translate([10,10,length/2]) union() {
		difference() {
			profile(length);
			translate([0,0,-length/2+(heightHole+plunge)/2-plunge]) hole(heightHole+plunge, size+tolerance);
		}
		translate([0,0,length/2+(heightPin+plunge)/2-plunge]) cube([size-tolerance,size-tolerance,heightPin+plunge], center = true);
	}
}

module profile(length) { // generate a profile based on length
	difference() {
		// Create main body
		cube([20,20,length], center = true);
		
		// Create hole in middle
		cylinder(r=5/2, h=length+2, center = true);

		// Create groove
		grooveLength = length + 2;
		lengthOfCenterSide = 5.75;
		gabWidth = 6.5;
		gabDepth = 6.1;
		sizeOfCube = 12;
		gabFrontWallWidth = 1.5;
		sizeOfCornerCube = sqrt(pow(sizeOfCube/2, 2)*2);
		for(i = [0:90:270]) {
			rotate([0,0,i]) translate([sizeOfCube/2-gabDepth+20/2,0,0]) difference() {
				cube([sizeOfCube,sizeOfCube,grooveLength], center = true);
				translate([-sizeOfCube/2,-sizeOfCube/2-lengthOfCenterSide/2,0]) rotate([0,0,45]) cube([sizeOfCornerCube,sizeOfCornerCube,grooveLength+2], center = true);
				translate([-sizeOfCube/2,sizeOfCube/2+lengthOfCenterSide/2,0]) rotate([0,0,45]) cube([sizeOfCornerCube,sizeOfCornerCube,grooveLength+2], center = true);
				translate([gabDepth-gabFrontWallWidth,sizeOfCube/2+gabWidth/2,0]) cube([sizeOfCube,sizeOfCube,grooveLength+2], center = true);
				translate([gabDepth-gabFrontWallWidth,-sizeOfCube/2-gabWidth/2,0]) cube([sizeOfCube,sizeOfCube,grooveLength+2], center = true);
			}
		}
	}
}
//cube([20,20,length]);
